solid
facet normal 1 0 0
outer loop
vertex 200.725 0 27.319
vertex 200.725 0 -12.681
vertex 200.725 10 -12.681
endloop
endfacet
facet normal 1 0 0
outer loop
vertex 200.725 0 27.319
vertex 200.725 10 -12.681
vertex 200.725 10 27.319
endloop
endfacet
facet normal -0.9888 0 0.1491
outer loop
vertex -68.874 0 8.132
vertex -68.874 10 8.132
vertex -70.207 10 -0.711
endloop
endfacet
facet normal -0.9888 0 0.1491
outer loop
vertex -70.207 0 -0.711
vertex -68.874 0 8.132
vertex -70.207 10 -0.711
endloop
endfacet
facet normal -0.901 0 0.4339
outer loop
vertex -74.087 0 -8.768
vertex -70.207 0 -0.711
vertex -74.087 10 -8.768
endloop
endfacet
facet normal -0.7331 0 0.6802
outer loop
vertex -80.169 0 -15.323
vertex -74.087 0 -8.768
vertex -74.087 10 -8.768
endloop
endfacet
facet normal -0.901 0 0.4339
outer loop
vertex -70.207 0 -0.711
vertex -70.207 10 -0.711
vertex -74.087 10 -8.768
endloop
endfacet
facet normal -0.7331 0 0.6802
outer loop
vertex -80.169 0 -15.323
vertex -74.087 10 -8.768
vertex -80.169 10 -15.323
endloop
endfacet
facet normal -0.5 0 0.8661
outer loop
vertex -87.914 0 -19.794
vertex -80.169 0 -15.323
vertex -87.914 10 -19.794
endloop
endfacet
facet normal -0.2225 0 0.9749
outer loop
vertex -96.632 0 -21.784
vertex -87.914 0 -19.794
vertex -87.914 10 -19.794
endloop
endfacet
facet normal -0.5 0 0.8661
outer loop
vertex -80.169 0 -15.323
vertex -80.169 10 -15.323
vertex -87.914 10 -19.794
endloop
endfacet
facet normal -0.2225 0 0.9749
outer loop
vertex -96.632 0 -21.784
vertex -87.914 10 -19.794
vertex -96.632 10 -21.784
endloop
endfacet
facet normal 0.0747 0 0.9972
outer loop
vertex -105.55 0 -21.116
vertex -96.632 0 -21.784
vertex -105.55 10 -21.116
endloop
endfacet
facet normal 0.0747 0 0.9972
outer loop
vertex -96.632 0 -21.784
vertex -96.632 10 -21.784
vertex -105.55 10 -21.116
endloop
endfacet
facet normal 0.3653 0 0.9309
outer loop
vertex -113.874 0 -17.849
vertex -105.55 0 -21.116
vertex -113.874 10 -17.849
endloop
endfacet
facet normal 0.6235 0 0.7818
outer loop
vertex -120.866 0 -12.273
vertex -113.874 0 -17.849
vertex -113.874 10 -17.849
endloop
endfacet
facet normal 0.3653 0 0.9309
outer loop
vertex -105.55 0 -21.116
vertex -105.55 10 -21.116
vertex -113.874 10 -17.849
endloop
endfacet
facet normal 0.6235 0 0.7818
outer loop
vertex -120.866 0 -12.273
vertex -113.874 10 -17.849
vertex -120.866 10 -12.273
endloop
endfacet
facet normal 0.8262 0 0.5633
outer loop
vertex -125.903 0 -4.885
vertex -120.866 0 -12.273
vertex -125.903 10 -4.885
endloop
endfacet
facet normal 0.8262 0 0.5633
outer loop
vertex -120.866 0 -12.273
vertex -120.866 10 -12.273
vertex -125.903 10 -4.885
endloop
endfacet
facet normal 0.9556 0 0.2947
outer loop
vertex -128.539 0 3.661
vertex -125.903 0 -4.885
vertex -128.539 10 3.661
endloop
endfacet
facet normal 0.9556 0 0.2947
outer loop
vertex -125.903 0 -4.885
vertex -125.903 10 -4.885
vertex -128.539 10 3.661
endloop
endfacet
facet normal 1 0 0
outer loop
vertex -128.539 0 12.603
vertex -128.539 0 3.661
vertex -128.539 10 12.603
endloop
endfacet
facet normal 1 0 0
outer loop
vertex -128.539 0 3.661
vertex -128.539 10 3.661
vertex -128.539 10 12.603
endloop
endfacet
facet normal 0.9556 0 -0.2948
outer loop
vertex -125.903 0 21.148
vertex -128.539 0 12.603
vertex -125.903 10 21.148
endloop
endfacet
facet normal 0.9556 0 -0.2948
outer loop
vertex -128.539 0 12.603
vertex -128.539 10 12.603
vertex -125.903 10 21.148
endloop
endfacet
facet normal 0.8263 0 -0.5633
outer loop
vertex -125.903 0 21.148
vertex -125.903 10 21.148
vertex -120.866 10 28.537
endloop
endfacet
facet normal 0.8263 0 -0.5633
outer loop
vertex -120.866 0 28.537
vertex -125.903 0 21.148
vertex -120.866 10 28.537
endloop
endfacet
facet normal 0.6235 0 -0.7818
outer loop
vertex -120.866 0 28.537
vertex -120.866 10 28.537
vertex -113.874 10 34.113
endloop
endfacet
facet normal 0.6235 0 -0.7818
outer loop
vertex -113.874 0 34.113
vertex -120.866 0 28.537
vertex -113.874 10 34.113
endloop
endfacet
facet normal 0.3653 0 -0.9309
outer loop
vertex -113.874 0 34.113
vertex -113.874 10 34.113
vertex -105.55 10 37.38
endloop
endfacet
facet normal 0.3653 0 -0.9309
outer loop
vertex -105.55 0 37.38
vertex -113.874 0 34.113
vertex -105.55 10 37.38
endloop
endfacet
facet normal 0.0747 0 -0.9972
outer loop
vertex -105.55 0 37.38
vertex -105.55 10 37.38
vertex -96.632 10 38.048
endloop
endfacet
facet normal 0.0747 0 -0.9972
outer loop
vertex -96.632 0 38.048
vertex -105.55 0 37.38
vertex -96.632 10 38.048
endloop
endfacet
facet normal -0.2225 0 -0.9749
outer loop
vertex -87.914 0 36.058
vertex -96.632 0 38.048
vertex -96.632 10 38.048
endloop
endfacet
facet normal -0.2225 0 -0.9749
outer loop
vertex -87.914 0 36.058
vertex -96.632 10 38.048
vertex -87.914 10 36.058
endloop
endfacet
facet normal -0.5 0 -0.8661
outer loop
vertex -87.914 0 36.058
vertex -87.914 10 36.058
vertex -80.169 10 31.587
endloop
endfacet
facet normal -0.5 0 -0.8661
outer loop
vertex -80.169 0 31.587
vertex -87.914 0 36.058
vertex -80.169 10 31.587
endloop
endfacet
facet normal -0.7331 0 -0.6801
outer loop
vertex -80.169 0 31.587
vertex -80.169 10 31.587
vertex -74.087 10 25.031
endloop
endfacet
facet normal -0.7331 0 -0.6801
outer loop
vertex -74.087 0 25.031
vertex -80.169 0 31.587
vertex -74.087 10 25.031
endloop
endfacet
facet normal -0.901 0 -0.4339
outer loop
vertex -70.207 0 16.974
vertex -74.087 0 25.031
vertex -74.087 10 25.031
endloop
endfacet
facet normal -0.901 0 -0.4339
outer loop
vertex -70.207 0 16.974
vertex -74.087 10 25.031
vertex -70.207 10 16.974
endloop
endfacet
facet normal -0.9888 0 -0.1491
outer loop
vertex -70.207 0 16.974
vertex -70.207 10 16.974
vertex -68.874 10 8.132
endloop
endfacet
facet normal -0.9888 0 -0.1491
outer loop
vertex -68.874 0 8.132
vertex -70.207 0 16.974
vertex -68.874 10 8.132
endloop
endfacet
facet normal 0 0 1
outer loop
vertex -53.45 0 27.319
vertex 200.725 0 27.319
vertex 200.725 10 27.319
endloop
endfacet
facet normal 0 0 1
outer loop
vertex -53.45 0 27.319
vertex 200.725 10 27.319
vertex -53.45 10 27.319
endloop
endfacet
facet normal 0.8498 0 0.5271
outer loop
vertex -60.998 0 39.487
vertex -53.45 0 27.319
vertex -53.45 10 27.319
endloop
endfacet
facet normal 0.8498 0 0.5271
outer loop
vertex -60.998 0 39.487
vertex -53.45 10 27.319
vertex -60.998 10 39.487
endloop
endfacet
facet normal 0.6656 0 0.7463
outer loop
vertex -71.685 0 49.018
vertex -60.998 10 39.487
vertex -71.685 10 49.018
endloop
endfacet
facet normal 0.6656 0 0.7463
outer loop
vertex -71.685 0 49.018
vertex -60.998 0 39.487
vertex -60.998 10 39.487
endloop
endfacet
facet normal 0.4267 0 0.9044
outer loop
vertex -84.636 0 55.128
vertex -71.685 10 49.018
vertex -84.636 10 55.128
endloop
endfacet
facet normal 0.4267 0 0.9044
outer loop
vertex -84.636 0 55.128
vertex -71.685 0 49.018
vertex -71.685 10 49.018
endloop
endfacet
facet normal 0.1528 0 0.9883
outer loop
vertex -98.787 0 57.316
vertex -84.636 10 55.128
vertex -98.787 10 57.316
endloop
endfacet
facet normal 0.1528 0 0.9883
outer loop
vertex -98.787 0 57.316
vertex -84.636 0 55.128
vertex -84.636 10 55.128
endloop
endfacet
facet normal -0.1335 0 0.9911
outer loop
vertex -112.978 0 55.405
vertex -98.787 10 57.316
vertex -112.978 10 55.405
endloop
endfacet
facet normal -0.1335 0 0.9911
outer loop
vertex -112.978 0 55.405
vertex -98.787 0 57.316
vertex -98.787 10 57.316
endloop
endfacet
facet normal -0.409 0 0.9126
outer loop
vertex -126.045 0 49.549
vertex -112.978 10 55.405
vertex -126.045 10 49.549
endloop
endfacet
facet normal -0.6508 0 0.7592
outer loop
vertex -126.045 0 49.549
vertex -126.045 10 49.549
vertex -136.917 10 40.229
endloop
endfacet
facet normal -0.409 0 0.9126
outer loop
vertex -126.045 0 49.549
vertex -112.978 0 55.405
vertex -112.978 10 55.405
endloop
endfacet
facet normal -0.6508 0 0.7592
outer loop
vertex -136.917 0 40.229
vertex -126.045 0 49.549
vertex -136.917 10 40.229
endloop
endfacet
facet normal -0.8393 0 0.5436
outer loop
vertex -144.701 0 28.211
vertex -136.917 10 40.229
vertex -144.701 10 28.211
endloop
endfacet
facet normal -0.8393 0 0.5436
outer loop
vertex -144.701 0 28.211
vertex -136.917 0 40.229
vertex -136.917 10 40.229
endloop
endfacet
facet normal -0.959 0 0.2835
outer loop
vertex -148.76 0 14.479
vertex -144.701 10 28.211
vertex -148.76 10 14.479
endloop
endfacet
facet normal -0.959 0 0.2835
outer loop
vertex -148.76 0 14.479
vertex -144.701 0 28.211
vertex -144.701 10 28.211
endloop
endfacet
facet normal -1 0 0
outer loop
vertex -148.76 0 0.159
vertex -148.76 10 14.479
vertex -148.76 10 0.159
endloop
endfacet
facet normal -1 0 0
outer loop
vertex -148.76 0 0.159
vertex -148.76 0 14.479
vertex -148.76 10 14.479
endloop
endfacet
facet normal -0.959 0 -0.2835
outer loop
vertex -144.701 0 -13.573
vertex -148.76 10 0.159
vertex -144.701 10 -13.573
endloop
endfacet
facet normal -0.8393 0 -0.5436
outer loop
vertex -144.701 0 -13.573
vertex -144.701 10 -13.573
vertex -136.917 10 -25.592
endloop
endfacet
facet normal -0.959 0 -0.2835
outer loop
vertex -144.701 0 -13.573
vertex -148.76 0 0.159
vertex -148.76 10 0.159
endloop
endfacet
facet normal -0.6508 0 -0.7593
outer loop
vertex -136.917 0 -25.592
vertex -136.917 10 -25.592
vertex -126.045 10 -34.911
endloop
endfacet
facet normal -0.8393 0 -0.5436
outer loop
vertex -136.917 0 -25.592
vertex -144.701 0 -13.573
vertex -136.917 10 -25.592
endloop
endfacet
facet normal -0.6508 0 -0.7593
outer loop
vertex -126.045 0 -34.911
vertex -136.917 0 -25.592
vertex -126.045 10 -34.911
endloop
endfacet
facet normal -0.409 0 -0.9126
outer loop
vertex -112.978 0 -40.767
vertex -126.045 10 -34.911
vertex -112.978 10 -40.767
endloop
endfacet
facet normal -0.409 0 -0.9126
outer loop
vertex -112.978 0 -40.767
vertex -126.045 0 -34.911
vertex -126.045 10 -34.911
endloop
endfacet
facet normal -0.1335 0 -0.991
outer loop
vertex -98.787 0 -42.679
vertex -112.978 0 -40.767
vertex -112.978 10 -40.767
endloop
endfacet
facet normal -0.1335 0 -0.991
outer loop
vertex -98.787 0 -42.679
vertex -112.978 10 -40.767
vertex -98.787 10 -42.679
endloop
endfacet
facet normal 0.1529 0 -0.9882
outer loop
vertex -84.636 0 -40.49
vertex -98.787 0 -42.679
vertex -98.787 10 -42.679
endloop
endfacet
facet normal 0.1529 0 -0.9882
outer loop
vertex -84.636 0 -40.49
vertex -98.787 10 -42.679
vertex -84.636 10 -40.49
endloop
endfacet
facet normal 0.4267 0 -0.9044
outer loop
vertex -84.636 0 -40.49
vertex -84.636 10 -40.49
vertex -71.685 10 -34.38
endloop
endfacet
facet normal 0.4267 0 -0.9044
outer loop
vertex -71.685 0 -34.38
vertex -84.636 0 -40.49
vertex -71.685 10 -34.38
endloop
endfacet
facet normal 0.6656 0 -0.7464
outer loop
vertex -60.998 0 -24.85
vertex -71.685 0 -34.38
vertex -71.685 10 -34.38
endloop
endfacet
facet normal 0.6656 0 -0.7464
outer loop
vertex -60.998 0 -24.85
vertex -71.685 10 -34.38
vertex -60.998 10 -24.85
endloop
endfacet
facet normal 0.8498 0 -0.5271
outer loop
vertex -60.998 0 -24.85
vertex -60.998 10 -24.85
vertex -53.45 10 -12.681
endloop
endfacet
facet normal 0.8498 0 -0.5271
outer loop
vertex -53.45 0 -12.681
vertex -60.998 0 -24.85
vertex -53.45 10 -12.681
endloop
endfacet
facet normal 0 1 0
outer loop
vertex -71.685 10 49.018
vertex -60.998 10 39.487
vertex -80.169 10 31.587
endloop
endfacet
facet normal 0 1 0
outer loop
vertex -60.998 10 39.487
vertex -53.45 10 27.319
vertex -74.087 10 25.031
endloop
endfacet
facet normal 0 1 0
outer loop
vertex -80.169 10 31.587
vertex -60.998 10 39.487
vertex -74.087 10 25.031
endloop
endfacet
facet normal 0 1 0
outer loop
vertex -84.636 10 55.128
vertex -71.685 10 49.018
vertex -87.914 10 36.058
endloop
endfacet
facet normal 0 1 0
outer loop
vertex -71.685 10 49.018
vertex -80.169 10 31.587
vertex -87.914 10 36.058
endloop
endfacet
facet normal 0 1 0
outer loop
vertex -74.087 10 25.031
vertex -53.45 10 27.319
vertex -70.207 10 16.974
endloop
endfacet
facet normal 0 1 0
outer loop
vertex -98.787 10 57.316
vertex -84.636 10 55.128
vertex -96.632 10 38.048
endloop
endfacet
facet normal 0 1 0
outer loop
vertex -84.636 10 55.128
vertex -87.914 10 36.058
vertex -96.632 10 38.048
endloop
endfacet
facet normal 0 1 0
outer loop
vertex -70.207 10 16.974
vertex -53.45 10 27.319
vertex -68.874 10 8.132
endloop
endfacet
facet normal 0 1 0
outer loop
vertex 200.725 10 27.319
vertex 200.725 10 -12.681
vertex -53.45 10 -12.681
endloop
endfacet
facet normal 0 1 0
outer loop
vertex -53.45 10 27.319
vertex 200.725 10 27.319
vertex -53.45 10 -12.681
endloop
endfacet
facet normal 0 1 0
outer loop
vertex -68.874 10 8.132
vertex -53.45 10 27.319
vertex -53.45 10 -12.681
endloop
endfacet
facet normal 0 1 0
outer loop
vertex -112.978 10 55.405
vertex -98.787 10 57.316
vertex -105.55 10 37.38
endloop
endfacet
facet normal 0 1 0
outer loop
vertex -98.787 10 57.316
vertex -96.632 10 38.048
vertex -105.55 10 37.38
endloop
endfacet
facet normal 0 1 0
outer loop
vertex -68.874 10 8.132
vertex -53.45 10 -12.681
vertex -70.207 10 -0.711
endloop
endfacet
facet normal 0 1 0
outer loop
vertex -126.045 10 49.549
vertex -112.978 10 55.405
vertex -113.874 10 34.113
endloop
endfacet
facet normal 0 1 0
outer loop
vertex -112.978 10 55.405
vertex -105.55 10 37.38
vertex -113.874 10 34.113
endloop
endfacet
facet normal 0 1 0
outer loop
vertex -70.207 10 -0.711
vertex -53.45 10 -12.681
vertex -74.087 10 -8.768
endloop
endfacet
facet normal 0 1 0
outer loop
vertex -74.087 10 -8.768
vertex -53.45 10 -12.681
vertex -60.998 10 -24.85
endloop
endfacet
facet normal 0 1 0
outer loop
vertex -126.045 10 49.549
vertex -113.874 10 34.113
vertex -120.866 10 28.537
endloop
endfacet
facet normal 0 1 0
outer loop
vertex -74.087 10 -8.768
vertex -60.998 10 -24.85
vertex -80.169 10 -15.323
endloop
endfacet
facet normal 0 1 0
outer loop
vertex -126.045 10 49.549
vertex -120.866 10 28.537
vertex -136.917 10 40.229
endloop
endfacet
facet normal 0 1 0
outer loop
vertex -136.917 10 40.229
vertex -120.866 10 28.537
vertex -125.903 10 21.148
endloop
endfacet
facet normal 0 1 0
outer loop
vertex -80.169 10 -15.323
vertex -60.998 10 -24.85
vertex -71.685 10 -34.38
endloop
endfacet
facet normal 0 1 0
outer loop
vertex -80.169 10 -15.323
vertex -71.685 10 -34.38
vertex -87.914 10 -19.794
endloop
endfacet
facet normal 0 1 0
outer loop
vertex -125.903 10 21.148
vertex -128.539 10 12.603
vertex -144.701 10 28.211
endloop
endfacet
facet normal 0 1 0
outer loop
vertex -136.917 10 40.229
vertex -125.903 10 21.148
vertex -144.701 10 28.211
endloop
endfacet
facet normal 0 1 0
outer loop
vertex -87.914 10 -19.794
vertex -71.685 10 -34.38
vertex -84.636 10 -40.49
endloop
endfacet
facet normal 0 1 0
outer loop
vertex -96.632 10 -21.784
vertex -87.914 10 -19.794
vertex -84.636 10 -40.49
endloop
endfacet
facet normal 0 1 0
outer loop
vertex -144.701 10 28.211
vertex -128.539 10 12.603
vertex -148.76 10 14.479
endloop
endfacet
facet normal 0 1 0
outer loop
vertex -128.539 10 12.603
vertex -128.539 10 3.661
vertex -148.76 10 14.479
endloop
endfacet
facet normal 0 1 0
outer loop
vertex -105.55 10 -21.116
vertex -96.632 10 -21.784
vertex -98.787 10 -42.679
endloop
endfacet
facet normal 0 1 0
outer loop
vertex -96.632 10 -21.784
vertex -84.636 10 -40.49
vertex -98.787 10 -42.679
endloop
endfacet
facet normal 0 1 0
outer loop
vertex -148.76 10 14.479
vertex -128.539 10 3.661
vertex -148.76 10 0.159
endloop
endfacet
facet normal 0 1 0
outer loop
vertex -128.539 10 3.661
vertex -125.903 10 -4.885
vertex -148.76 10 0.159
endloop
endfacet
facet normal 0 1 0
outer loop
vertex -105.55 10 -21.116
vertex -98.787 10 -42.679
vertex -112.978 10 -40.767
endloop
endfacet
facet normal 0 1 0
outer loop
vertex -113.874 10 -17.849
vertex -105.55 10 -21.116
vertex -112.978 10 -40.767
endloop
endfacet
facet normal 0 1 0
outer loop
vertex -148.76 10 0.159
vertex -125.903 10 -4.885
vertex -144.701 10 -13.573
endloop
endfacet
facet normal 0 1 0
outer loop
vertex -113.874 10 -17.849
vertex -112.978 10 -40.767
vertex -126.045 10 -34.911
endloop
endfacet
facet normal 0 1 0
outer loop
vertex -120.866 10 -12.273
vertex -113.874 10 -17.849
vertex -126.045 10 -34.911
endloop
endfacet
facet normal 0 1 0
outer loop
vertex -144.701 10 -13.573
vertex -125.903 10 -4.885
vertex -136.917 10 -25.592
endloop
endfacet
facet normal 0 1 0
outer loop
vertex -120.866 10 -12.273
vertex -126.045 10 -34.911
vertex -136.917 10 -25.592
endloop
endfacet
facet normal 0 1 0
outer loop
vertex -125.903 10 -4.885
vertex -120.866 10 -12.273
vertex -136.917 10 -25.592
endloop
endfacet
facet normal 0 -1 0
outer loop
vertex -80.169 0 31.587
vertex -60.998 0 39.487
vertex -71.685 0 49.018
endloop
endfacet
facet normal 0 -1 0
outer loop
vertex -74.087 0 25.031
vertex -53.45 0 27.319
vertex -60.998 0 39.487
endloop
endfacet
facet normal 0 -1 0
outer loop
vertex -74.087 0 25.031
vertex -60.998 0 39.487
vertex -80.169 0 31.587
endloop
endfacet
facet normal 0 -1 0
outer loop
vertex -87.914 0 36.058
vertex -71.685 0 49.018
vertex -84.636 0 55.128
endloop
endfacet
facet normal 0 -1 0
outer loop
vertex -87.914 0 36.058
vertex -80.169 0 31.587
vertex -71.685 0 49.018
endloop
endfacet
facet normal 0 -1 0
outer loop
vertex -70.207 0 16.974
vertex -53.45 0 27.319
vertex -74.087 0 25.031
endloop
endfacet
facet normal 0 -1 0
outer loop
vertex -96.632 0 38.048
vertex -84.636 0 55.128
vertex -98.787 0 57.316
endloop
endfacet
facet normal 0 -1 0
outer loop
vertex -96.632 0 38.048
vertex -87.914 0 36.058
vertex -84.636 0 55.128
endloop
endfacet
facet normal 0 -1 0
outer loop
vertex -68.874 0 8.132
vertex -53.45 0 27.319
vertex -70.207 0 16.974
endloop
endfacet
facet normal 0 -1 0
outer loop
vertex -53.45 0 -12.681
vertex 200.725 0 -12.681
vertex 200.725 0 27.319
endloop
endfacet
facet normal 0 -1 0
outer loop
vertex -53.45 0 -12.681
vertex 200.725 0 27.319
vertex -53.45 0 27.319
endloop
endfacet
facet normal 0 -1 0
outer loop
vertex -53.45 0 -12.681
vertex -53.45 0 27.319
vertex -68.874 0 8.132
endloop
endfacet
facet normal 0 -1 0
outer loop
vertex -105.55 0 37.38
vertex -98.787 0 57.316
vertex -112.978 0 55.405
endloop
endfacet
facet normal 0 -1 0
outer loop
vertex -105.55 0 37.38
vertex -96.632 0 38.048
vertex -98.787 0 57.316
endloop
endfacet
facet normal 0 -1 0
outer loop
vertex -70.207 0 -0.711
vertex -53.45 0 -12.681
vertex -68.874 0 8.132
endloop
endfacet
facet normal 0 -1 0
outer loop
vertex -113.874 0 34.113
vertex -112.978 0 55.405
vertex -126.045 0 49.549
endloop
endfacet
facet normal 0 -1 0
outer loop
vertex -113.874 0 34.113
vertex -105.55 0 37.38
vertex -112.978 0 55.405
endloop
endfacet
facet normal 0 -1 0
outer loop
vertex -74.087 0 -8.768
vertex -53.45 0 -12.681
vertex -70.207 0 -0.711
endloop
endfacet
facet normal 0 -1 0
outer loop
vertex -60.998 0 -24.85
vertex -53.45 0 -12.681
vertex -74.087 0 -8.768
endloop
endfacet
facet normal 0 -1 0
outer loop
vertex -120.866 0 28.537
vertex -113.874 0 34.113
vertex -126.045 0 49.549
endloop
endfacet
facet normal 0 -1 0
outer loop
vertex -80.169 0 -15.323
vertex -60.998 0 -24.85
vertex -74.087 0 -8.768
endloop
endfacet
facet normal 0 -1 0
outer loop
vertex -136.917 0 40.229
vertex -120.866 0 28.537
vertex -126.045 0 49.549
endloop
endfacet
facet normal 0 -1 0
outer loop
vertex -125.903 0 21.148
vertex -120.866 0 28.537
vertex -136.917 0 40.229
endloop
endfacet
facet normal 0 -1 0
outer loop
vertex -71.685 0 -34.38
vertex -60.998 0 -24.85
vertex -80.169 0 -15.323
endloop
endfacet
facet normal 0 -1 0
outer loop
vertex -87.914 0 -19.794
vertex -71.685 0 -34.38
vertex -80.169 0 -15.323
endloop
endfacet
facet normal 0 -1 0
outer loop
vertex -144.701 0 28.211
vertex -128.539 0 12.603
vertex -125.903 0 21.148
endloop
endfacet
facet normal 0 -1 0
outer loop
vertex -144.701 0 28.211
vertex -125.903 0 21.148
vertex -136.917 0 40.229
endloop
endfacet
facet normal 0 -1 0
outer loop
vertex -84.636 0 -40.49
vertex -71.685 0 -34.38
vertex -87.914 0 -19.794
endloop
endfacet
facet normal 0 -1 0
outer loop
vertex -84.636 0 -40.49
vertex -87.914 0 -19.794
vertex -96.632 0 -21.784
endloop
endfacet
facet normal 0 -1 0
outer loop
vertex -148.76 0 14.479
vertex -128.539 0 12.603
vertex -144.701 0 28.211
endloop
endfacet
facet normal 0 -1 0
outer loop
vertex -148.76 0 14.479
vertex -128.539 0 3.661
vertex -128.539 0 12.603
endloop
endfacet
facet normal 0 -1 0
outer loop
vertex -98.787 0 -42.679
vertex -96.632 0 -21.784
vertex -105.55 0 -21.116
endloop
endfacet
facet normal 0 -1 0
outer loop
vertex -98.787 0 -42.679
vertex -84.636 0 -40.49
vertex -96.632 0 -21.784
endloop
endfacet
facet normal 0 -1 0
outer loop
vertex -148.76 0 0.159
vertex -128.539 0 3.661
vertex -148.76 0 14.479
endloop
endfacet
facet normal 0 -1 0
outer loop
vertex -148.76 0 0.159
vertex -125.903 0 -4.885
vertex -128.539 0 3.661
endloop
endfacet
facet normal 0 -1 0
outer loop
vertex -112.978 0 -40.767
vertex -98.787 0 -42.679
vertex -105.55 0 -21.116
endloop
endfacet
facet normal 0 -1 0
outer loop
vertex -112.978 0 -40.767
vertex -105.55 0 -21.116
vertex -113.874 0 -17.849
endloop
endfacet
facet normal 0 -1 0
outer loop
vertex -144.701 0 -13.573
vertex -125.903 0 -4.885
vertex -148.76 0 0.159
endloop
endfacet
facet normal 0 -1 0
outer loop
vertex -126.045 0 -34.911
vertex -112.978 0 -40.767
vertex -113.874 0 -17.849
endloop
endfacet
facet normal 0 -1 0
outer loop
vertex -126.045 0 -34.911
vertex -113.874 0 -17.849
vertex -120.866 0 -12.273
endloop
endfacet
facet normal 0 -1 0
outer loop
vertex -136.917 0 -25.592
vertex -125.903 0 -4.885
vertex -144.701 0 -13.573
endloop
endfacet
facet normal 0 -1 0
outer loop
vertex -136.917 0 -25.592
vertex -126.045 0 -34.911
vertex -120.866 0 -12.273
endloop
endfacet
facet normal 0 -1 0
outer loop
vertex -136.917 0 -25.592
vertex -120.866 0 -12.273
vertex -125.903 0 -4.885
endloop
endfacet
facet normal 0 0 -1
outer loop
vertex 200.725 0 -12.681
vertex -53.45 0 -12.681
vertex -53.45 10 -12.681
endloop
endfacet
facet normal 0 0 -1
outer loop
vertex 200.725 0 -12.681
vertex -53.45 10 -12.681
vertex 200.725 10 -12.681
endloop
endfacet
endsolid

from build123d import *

# Parameters (mm, degrees)
BOSS_EXTRUDE1_DEPTH = 10
SKETCH2_R           = 30
CUT_EXTRUDE1_DEPTH  = 11


with BuildPart() as part:
    # Sketch1 → Boss-Extrude1 (new body)
    with BuildSketch(Plane(origin=(0, 0, 0), x_dir=(1, 0, 0), z_dir=(0, 1, 0))):
        with BuildLine():
            Line((-53.449605369, 12.68115942), (200.724637681, 12.68115942))
            Line((200.724637681, 12.68115942), (200.724637681, -27.31884058))
            Line((200.724637681, -27.31884058), (-53.449605369, -27.31884058))
            ThreePointArc((-53.449605369, -27.31884058), (-149.275362319, -7.31884058), (-53.449605369, 12.68115942))
        make_face()
    extrude(amount=BOSS_EXTRUDE1_DEPTH)

    # Sketch2 → Cut-Extrude1 (cut, through all)
    with BuildSketch(Plane(origin=(0, 10, 0), x_dir=(1, 0, 0), z_dir=(0, 1, 0))):
        with Locations((-98.874058495, -8.131832766)):
            Circle(SKETCH2_R)
    extrude(amount=-CUT_EXTRUDE1_DEPTH, mode=Mode.SUBTRACT)


solid = part.part
